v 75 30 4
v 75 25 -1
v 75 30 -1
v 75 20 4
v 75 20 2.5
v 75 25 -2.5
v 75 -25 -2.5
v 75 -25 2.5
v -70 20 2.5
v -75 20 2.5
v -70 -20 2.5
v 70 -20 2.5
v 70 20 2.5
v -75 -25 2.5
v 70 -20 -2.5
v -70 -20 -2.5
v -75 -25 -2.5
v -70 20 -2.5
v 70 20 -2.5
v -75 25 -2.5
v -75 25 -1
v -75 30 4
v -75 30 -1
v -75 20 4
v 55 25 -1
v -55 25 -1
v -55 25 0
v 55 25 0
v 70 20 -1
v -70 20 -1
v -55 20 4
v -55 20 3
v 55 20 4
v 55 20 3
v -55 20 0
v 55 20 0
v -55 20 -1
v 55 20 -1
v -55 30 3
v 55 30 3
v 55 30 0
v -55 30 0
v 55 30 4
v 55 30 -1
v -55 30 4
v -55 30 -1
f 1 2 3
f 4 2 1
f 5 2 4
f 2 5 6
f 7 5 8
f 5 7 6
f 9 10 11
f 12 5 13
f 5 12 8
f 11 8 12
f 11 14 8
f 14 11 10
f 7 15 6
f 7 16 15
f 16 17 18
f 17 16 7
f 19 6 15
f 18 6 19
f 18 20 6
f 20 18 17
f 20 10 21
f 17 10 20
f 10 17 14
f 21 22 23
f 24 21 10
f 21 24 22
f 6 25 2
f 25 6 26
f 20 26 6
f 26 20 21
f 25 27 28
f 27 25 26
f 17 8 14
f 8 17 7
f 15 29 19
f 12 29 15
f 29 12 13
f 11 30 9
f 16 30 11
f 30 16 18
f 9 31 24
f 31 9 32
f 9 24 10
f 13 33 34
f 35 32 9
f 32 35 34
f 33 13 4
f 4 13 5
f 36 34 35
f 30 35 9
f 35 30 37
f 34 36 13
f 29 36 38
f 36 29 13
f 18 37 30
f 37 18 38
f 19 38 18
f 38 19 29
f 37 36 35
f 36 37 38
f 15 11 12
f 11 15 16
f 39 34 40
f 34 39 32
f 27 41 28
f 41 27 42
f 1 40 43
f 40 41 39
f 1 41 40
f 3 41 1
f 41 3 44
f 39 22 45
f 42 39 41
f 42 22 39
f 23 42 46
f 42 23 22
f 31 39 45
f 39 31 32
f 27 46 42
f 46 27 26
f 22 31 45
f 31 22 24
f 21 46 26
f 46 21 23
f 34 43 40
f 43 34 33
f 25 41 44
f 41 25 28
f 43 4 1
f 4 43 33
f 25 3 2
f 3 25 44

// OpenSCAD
union() {
	difference() {
		cube(center = true, size = [150, 50, 5]);
		translate(v = [0, 0, 0.5000000000]) {
			cube(center = true, size = [140, 40, 6]);
		}
	}
	translate(v = [-75.0000000000, 20.0000000000, 0]) {
		union() {
			cube(size = [120, 10, 3]);
			translate(v = [0, 0, -1.0000000000]) {
				cube(size = [20, 10, 5]);
			}
		}
	}
	mirror(v = [1, 0, 0]) {
		translate(v = [-75.0000000000, 20.0000000000, 0]) {
			union() {
				cube(size = [120, 10, 3]);
				translate(v = [0, 0, -1.0000000000]) {
					cube(size = [20, 10, 5]);
				}
			}
		}
	}
}
